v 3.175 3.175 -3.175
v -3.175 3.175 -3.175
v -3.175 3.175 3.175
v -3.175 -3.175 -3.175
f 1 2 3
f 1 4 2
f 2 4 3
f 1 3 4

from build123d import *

# Parameters (mm, degrees)
F0_W     = 6.35
F0_H     = 6.35
F1_DEPTH = 3.175
F2_SIZE  = 6.34999


# Not quite as in the source:
# - a fillet or chamfer is up to 0.001 mm smaller than in the source, because OpenCascade refuses the exact size


with BuildPart() as f1:
    # F0 (on Right) → F1 (new body, symmetric)
    with BuildSketch(Plane.YZ):
        Rectangle(F0_W, F0_H)
    extrude(amount=F1_DEPTH, both=True)

    # F2 (size 6.35 in the source; OpenCascade refuses exactly that, so slightly less here)
    f2_edges = [f1.edges().sort_by_distance(p)[0] for p in [
        (0, -3.175, 3.175),
        (3.175, 0, 3.175),
        (3.175, -3.175, 0),
    ]]
    chamfer(f2_edges, length=F2_SIZE)


solid = f1.part
